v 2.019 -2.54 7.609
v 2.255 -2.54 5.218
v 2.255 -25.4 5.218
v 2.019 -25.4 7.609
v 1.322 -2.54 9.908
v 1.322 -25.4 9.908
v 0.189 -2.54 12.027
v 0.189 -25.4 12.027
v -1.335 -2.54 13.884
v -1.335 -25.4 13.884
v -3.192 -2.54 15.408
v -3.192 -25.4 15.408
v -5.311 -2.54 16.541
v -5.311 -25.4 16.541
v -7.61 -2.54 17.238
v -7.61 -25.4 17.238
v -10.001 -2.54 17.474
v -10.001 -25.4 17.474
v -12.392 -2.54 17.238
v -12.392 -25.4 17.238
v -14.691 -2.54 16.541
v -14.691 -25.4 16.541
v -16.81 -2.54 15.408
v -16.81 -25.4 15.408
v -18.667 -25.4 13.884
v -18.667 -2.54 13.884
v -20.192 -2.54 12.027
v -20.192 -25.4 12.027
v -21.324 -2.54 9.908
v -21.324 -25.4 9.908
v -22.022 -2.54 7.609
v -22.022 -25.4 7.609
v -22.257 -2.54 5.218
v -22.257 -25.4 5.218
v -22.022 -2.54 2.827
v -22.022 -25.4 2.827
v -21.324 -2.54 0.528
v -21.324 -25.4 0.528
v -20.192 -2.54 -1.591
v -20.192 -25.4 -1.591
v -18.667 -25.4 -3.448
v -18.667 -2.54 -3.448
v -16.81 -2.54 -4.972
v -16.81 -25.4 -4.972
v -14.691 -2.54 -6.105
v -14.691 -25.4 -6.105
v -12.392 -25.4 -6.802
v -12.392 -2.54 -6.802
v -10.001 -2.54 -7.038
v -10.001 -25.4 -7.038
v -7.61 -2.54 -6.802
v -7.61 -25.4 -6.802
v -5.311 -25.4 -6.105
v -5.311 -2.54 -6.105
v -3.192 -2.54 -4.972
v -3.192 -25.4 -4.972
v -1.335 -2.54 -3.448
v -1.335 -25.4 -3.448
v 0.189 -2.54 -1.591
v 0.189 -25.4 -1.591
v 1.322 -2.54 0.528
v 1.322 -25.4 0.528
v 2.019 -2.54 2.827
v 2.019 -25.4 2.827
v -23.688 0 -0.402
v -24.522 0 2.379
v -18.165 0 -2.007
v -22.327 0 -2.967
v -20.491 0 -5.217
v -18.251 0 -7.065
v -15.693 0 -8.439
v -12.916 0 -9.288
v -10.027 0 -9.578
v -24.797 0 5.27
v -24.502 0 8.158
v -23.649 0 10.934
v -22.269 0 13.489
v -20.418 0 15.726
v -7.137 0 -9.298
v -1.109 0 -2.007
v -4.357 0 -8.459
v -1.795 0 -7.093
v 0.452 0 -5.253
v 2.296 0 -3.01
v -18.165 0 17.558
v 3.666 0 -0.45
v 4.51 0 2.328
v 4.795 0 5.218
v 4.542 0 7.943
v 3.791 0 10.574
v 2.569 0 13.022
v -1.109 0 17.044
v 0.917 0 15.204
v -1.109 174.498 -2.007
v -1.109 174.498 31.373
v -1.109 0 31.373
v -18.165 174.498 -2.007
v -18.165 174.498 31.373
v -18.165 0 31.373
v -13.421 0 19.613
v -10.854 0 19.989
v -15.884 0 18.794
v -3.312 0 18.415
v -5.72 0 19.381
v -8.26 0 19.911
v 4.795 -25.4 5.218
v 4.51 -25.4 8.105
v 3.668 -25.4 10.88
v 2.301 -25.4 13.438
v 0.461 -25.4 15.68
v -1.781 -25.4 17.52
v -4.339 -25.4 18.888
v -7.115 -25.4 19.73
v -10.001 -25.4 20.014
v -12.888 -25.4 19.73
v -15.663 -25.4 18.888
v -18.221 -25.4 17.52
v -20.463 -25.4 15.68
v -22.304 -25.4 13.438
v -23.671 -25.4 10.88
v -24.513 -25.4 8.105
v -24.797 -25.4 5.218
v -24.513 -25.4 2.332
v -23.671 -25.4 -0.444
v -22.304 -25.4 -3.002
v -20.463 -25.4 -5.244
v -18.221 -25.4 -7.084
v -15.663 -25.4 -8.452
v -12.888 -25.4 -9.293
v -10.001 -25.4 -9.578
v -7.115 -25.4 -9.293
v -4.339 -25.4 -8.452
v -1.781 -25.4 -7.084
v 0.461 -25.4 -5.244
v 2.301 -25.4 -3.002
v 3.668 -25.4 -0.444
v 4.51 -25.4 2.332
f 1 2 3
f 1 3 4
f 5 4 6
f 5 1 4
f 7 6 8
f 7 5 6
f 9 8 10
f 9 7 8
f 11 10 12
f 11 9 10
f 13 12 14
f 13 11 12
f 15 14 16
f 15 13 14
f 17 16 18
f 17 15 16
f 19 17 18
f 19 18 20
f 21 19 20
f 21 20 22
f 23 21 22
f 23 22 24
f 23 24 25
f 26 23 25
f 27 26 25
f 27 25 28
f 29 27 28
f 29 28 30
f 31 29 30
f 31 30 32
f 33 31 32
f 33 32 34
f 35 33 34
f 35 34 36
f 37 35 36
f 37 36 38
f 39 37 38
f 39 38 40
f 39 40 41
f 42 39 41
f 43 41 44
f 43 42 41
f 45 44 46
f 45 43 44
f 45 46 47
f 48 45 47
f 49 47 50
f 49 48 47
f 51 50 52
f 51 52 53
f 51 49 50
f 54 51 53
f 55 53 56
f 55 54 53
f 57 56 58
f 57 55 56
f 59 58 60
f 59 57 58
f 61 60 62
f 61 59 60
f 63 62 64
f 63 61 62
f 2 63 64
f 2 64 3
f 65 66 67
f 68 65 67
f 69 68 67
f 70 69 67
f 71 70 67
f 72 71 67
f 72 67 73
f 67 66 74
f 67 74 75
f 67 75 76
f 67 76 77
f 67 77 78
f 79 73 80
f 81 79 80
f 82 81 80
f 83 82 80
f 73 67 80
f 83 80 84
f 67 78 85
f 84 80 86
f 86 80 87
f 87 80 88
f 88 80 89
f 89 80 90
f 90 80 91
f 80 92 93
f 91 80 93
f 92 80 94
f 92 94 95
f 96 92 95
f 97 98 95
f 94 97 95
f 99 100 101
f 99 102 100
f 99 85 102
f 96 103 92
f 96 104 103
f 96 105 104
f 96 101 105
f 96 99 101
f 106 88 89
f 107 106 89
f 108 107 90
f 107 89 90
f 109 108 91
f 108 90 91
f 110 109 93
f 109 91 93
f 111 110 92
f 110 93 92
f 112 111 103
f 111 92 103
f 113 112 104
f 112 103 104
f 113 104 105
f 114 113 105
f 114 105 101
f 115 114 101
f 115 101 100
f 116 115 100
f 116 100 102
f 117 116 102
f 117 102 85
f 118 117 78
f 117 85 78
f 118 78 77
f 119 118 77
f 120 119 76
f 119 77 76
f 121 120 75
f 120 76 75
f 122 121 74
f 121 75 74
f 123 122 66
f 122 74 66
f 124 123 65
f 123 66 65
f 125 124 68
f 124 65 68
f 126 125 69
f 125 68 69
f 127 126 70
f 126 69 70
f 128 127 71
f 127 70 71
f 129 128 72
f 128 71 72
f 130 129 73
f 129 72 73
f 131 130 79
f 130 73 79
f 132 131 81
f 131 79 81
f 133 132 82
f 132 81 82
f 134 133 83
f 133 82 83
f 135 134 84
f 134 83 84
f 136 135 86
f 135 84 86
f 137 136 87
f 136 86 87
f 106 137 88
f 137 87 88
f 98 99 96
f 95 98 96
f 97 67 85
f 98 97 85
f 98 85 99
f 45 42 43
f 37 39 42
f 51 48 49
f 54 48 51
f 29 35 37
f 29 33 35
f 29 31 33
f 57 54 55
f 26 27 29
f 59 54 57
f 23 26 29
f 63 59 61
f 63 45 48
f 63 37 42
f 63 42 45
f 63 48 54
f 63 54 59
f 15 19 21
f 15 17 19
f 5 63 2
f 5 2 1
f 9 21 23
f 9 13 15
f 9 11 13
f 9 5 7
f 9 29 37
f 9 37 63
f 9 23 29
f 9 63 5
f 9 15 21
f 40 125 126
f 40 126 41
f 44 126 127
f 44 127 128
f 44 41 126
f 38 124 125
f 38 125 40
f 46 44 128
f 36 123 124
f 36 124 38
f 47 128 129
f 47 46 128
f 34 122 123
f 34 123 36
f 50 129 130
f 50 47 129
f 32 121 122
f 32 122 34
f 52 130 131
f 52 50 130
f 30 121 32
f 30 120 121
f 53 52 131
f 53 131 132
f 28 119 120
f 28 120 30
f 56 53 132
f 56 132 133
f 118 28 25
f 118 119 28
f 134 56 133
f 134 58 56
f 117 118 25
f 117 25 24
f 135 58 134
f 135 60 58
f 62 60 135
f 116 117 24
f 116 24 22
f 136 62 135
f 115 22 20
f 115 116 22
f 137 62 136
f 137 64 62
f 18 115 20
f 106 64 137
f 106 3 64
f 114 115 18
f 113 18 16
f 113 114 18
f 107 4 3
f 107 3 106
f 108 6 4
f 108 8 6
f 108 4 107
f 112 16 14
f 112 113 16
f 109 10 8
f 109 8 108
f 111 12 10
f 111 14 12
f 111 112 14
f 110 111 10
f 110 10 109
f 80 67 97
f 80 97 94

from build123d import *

# Parameters (mm, degrees)
F0_R     = 14.79582
F1_DEPTH = 25.4
F2_T     = -2.54
F3_W     = 17.056221
F3_H     = 33.380184
F4_DEPTH = 174.498


with BuildPart() as f1:
    # F0 (on Front) → F1 (new body)
    with BuildSketch(Plane.XZ):
        with Locations((-10.001251, 5.218043)):
            Circle(F0_R)
    extrude(amount=F1_DEPTH)

    # F2
    f2_openings = [f1.faces().sort_by_distance(p)[0] for p in [
        (-10.001251, -25.4, 5.218043),
    ]]
    offset(amount=F2_T, openings=f2_openings)

    # F3 (on Front) → F4 (join)
    with BuildSketch(Plane.XZ):
        with Locations((-9.636964, 14.683178)):
            Rectangle(F3_W, F3_H)
    extrude(amount=-F4_DEPTH)


solid = f1.part
